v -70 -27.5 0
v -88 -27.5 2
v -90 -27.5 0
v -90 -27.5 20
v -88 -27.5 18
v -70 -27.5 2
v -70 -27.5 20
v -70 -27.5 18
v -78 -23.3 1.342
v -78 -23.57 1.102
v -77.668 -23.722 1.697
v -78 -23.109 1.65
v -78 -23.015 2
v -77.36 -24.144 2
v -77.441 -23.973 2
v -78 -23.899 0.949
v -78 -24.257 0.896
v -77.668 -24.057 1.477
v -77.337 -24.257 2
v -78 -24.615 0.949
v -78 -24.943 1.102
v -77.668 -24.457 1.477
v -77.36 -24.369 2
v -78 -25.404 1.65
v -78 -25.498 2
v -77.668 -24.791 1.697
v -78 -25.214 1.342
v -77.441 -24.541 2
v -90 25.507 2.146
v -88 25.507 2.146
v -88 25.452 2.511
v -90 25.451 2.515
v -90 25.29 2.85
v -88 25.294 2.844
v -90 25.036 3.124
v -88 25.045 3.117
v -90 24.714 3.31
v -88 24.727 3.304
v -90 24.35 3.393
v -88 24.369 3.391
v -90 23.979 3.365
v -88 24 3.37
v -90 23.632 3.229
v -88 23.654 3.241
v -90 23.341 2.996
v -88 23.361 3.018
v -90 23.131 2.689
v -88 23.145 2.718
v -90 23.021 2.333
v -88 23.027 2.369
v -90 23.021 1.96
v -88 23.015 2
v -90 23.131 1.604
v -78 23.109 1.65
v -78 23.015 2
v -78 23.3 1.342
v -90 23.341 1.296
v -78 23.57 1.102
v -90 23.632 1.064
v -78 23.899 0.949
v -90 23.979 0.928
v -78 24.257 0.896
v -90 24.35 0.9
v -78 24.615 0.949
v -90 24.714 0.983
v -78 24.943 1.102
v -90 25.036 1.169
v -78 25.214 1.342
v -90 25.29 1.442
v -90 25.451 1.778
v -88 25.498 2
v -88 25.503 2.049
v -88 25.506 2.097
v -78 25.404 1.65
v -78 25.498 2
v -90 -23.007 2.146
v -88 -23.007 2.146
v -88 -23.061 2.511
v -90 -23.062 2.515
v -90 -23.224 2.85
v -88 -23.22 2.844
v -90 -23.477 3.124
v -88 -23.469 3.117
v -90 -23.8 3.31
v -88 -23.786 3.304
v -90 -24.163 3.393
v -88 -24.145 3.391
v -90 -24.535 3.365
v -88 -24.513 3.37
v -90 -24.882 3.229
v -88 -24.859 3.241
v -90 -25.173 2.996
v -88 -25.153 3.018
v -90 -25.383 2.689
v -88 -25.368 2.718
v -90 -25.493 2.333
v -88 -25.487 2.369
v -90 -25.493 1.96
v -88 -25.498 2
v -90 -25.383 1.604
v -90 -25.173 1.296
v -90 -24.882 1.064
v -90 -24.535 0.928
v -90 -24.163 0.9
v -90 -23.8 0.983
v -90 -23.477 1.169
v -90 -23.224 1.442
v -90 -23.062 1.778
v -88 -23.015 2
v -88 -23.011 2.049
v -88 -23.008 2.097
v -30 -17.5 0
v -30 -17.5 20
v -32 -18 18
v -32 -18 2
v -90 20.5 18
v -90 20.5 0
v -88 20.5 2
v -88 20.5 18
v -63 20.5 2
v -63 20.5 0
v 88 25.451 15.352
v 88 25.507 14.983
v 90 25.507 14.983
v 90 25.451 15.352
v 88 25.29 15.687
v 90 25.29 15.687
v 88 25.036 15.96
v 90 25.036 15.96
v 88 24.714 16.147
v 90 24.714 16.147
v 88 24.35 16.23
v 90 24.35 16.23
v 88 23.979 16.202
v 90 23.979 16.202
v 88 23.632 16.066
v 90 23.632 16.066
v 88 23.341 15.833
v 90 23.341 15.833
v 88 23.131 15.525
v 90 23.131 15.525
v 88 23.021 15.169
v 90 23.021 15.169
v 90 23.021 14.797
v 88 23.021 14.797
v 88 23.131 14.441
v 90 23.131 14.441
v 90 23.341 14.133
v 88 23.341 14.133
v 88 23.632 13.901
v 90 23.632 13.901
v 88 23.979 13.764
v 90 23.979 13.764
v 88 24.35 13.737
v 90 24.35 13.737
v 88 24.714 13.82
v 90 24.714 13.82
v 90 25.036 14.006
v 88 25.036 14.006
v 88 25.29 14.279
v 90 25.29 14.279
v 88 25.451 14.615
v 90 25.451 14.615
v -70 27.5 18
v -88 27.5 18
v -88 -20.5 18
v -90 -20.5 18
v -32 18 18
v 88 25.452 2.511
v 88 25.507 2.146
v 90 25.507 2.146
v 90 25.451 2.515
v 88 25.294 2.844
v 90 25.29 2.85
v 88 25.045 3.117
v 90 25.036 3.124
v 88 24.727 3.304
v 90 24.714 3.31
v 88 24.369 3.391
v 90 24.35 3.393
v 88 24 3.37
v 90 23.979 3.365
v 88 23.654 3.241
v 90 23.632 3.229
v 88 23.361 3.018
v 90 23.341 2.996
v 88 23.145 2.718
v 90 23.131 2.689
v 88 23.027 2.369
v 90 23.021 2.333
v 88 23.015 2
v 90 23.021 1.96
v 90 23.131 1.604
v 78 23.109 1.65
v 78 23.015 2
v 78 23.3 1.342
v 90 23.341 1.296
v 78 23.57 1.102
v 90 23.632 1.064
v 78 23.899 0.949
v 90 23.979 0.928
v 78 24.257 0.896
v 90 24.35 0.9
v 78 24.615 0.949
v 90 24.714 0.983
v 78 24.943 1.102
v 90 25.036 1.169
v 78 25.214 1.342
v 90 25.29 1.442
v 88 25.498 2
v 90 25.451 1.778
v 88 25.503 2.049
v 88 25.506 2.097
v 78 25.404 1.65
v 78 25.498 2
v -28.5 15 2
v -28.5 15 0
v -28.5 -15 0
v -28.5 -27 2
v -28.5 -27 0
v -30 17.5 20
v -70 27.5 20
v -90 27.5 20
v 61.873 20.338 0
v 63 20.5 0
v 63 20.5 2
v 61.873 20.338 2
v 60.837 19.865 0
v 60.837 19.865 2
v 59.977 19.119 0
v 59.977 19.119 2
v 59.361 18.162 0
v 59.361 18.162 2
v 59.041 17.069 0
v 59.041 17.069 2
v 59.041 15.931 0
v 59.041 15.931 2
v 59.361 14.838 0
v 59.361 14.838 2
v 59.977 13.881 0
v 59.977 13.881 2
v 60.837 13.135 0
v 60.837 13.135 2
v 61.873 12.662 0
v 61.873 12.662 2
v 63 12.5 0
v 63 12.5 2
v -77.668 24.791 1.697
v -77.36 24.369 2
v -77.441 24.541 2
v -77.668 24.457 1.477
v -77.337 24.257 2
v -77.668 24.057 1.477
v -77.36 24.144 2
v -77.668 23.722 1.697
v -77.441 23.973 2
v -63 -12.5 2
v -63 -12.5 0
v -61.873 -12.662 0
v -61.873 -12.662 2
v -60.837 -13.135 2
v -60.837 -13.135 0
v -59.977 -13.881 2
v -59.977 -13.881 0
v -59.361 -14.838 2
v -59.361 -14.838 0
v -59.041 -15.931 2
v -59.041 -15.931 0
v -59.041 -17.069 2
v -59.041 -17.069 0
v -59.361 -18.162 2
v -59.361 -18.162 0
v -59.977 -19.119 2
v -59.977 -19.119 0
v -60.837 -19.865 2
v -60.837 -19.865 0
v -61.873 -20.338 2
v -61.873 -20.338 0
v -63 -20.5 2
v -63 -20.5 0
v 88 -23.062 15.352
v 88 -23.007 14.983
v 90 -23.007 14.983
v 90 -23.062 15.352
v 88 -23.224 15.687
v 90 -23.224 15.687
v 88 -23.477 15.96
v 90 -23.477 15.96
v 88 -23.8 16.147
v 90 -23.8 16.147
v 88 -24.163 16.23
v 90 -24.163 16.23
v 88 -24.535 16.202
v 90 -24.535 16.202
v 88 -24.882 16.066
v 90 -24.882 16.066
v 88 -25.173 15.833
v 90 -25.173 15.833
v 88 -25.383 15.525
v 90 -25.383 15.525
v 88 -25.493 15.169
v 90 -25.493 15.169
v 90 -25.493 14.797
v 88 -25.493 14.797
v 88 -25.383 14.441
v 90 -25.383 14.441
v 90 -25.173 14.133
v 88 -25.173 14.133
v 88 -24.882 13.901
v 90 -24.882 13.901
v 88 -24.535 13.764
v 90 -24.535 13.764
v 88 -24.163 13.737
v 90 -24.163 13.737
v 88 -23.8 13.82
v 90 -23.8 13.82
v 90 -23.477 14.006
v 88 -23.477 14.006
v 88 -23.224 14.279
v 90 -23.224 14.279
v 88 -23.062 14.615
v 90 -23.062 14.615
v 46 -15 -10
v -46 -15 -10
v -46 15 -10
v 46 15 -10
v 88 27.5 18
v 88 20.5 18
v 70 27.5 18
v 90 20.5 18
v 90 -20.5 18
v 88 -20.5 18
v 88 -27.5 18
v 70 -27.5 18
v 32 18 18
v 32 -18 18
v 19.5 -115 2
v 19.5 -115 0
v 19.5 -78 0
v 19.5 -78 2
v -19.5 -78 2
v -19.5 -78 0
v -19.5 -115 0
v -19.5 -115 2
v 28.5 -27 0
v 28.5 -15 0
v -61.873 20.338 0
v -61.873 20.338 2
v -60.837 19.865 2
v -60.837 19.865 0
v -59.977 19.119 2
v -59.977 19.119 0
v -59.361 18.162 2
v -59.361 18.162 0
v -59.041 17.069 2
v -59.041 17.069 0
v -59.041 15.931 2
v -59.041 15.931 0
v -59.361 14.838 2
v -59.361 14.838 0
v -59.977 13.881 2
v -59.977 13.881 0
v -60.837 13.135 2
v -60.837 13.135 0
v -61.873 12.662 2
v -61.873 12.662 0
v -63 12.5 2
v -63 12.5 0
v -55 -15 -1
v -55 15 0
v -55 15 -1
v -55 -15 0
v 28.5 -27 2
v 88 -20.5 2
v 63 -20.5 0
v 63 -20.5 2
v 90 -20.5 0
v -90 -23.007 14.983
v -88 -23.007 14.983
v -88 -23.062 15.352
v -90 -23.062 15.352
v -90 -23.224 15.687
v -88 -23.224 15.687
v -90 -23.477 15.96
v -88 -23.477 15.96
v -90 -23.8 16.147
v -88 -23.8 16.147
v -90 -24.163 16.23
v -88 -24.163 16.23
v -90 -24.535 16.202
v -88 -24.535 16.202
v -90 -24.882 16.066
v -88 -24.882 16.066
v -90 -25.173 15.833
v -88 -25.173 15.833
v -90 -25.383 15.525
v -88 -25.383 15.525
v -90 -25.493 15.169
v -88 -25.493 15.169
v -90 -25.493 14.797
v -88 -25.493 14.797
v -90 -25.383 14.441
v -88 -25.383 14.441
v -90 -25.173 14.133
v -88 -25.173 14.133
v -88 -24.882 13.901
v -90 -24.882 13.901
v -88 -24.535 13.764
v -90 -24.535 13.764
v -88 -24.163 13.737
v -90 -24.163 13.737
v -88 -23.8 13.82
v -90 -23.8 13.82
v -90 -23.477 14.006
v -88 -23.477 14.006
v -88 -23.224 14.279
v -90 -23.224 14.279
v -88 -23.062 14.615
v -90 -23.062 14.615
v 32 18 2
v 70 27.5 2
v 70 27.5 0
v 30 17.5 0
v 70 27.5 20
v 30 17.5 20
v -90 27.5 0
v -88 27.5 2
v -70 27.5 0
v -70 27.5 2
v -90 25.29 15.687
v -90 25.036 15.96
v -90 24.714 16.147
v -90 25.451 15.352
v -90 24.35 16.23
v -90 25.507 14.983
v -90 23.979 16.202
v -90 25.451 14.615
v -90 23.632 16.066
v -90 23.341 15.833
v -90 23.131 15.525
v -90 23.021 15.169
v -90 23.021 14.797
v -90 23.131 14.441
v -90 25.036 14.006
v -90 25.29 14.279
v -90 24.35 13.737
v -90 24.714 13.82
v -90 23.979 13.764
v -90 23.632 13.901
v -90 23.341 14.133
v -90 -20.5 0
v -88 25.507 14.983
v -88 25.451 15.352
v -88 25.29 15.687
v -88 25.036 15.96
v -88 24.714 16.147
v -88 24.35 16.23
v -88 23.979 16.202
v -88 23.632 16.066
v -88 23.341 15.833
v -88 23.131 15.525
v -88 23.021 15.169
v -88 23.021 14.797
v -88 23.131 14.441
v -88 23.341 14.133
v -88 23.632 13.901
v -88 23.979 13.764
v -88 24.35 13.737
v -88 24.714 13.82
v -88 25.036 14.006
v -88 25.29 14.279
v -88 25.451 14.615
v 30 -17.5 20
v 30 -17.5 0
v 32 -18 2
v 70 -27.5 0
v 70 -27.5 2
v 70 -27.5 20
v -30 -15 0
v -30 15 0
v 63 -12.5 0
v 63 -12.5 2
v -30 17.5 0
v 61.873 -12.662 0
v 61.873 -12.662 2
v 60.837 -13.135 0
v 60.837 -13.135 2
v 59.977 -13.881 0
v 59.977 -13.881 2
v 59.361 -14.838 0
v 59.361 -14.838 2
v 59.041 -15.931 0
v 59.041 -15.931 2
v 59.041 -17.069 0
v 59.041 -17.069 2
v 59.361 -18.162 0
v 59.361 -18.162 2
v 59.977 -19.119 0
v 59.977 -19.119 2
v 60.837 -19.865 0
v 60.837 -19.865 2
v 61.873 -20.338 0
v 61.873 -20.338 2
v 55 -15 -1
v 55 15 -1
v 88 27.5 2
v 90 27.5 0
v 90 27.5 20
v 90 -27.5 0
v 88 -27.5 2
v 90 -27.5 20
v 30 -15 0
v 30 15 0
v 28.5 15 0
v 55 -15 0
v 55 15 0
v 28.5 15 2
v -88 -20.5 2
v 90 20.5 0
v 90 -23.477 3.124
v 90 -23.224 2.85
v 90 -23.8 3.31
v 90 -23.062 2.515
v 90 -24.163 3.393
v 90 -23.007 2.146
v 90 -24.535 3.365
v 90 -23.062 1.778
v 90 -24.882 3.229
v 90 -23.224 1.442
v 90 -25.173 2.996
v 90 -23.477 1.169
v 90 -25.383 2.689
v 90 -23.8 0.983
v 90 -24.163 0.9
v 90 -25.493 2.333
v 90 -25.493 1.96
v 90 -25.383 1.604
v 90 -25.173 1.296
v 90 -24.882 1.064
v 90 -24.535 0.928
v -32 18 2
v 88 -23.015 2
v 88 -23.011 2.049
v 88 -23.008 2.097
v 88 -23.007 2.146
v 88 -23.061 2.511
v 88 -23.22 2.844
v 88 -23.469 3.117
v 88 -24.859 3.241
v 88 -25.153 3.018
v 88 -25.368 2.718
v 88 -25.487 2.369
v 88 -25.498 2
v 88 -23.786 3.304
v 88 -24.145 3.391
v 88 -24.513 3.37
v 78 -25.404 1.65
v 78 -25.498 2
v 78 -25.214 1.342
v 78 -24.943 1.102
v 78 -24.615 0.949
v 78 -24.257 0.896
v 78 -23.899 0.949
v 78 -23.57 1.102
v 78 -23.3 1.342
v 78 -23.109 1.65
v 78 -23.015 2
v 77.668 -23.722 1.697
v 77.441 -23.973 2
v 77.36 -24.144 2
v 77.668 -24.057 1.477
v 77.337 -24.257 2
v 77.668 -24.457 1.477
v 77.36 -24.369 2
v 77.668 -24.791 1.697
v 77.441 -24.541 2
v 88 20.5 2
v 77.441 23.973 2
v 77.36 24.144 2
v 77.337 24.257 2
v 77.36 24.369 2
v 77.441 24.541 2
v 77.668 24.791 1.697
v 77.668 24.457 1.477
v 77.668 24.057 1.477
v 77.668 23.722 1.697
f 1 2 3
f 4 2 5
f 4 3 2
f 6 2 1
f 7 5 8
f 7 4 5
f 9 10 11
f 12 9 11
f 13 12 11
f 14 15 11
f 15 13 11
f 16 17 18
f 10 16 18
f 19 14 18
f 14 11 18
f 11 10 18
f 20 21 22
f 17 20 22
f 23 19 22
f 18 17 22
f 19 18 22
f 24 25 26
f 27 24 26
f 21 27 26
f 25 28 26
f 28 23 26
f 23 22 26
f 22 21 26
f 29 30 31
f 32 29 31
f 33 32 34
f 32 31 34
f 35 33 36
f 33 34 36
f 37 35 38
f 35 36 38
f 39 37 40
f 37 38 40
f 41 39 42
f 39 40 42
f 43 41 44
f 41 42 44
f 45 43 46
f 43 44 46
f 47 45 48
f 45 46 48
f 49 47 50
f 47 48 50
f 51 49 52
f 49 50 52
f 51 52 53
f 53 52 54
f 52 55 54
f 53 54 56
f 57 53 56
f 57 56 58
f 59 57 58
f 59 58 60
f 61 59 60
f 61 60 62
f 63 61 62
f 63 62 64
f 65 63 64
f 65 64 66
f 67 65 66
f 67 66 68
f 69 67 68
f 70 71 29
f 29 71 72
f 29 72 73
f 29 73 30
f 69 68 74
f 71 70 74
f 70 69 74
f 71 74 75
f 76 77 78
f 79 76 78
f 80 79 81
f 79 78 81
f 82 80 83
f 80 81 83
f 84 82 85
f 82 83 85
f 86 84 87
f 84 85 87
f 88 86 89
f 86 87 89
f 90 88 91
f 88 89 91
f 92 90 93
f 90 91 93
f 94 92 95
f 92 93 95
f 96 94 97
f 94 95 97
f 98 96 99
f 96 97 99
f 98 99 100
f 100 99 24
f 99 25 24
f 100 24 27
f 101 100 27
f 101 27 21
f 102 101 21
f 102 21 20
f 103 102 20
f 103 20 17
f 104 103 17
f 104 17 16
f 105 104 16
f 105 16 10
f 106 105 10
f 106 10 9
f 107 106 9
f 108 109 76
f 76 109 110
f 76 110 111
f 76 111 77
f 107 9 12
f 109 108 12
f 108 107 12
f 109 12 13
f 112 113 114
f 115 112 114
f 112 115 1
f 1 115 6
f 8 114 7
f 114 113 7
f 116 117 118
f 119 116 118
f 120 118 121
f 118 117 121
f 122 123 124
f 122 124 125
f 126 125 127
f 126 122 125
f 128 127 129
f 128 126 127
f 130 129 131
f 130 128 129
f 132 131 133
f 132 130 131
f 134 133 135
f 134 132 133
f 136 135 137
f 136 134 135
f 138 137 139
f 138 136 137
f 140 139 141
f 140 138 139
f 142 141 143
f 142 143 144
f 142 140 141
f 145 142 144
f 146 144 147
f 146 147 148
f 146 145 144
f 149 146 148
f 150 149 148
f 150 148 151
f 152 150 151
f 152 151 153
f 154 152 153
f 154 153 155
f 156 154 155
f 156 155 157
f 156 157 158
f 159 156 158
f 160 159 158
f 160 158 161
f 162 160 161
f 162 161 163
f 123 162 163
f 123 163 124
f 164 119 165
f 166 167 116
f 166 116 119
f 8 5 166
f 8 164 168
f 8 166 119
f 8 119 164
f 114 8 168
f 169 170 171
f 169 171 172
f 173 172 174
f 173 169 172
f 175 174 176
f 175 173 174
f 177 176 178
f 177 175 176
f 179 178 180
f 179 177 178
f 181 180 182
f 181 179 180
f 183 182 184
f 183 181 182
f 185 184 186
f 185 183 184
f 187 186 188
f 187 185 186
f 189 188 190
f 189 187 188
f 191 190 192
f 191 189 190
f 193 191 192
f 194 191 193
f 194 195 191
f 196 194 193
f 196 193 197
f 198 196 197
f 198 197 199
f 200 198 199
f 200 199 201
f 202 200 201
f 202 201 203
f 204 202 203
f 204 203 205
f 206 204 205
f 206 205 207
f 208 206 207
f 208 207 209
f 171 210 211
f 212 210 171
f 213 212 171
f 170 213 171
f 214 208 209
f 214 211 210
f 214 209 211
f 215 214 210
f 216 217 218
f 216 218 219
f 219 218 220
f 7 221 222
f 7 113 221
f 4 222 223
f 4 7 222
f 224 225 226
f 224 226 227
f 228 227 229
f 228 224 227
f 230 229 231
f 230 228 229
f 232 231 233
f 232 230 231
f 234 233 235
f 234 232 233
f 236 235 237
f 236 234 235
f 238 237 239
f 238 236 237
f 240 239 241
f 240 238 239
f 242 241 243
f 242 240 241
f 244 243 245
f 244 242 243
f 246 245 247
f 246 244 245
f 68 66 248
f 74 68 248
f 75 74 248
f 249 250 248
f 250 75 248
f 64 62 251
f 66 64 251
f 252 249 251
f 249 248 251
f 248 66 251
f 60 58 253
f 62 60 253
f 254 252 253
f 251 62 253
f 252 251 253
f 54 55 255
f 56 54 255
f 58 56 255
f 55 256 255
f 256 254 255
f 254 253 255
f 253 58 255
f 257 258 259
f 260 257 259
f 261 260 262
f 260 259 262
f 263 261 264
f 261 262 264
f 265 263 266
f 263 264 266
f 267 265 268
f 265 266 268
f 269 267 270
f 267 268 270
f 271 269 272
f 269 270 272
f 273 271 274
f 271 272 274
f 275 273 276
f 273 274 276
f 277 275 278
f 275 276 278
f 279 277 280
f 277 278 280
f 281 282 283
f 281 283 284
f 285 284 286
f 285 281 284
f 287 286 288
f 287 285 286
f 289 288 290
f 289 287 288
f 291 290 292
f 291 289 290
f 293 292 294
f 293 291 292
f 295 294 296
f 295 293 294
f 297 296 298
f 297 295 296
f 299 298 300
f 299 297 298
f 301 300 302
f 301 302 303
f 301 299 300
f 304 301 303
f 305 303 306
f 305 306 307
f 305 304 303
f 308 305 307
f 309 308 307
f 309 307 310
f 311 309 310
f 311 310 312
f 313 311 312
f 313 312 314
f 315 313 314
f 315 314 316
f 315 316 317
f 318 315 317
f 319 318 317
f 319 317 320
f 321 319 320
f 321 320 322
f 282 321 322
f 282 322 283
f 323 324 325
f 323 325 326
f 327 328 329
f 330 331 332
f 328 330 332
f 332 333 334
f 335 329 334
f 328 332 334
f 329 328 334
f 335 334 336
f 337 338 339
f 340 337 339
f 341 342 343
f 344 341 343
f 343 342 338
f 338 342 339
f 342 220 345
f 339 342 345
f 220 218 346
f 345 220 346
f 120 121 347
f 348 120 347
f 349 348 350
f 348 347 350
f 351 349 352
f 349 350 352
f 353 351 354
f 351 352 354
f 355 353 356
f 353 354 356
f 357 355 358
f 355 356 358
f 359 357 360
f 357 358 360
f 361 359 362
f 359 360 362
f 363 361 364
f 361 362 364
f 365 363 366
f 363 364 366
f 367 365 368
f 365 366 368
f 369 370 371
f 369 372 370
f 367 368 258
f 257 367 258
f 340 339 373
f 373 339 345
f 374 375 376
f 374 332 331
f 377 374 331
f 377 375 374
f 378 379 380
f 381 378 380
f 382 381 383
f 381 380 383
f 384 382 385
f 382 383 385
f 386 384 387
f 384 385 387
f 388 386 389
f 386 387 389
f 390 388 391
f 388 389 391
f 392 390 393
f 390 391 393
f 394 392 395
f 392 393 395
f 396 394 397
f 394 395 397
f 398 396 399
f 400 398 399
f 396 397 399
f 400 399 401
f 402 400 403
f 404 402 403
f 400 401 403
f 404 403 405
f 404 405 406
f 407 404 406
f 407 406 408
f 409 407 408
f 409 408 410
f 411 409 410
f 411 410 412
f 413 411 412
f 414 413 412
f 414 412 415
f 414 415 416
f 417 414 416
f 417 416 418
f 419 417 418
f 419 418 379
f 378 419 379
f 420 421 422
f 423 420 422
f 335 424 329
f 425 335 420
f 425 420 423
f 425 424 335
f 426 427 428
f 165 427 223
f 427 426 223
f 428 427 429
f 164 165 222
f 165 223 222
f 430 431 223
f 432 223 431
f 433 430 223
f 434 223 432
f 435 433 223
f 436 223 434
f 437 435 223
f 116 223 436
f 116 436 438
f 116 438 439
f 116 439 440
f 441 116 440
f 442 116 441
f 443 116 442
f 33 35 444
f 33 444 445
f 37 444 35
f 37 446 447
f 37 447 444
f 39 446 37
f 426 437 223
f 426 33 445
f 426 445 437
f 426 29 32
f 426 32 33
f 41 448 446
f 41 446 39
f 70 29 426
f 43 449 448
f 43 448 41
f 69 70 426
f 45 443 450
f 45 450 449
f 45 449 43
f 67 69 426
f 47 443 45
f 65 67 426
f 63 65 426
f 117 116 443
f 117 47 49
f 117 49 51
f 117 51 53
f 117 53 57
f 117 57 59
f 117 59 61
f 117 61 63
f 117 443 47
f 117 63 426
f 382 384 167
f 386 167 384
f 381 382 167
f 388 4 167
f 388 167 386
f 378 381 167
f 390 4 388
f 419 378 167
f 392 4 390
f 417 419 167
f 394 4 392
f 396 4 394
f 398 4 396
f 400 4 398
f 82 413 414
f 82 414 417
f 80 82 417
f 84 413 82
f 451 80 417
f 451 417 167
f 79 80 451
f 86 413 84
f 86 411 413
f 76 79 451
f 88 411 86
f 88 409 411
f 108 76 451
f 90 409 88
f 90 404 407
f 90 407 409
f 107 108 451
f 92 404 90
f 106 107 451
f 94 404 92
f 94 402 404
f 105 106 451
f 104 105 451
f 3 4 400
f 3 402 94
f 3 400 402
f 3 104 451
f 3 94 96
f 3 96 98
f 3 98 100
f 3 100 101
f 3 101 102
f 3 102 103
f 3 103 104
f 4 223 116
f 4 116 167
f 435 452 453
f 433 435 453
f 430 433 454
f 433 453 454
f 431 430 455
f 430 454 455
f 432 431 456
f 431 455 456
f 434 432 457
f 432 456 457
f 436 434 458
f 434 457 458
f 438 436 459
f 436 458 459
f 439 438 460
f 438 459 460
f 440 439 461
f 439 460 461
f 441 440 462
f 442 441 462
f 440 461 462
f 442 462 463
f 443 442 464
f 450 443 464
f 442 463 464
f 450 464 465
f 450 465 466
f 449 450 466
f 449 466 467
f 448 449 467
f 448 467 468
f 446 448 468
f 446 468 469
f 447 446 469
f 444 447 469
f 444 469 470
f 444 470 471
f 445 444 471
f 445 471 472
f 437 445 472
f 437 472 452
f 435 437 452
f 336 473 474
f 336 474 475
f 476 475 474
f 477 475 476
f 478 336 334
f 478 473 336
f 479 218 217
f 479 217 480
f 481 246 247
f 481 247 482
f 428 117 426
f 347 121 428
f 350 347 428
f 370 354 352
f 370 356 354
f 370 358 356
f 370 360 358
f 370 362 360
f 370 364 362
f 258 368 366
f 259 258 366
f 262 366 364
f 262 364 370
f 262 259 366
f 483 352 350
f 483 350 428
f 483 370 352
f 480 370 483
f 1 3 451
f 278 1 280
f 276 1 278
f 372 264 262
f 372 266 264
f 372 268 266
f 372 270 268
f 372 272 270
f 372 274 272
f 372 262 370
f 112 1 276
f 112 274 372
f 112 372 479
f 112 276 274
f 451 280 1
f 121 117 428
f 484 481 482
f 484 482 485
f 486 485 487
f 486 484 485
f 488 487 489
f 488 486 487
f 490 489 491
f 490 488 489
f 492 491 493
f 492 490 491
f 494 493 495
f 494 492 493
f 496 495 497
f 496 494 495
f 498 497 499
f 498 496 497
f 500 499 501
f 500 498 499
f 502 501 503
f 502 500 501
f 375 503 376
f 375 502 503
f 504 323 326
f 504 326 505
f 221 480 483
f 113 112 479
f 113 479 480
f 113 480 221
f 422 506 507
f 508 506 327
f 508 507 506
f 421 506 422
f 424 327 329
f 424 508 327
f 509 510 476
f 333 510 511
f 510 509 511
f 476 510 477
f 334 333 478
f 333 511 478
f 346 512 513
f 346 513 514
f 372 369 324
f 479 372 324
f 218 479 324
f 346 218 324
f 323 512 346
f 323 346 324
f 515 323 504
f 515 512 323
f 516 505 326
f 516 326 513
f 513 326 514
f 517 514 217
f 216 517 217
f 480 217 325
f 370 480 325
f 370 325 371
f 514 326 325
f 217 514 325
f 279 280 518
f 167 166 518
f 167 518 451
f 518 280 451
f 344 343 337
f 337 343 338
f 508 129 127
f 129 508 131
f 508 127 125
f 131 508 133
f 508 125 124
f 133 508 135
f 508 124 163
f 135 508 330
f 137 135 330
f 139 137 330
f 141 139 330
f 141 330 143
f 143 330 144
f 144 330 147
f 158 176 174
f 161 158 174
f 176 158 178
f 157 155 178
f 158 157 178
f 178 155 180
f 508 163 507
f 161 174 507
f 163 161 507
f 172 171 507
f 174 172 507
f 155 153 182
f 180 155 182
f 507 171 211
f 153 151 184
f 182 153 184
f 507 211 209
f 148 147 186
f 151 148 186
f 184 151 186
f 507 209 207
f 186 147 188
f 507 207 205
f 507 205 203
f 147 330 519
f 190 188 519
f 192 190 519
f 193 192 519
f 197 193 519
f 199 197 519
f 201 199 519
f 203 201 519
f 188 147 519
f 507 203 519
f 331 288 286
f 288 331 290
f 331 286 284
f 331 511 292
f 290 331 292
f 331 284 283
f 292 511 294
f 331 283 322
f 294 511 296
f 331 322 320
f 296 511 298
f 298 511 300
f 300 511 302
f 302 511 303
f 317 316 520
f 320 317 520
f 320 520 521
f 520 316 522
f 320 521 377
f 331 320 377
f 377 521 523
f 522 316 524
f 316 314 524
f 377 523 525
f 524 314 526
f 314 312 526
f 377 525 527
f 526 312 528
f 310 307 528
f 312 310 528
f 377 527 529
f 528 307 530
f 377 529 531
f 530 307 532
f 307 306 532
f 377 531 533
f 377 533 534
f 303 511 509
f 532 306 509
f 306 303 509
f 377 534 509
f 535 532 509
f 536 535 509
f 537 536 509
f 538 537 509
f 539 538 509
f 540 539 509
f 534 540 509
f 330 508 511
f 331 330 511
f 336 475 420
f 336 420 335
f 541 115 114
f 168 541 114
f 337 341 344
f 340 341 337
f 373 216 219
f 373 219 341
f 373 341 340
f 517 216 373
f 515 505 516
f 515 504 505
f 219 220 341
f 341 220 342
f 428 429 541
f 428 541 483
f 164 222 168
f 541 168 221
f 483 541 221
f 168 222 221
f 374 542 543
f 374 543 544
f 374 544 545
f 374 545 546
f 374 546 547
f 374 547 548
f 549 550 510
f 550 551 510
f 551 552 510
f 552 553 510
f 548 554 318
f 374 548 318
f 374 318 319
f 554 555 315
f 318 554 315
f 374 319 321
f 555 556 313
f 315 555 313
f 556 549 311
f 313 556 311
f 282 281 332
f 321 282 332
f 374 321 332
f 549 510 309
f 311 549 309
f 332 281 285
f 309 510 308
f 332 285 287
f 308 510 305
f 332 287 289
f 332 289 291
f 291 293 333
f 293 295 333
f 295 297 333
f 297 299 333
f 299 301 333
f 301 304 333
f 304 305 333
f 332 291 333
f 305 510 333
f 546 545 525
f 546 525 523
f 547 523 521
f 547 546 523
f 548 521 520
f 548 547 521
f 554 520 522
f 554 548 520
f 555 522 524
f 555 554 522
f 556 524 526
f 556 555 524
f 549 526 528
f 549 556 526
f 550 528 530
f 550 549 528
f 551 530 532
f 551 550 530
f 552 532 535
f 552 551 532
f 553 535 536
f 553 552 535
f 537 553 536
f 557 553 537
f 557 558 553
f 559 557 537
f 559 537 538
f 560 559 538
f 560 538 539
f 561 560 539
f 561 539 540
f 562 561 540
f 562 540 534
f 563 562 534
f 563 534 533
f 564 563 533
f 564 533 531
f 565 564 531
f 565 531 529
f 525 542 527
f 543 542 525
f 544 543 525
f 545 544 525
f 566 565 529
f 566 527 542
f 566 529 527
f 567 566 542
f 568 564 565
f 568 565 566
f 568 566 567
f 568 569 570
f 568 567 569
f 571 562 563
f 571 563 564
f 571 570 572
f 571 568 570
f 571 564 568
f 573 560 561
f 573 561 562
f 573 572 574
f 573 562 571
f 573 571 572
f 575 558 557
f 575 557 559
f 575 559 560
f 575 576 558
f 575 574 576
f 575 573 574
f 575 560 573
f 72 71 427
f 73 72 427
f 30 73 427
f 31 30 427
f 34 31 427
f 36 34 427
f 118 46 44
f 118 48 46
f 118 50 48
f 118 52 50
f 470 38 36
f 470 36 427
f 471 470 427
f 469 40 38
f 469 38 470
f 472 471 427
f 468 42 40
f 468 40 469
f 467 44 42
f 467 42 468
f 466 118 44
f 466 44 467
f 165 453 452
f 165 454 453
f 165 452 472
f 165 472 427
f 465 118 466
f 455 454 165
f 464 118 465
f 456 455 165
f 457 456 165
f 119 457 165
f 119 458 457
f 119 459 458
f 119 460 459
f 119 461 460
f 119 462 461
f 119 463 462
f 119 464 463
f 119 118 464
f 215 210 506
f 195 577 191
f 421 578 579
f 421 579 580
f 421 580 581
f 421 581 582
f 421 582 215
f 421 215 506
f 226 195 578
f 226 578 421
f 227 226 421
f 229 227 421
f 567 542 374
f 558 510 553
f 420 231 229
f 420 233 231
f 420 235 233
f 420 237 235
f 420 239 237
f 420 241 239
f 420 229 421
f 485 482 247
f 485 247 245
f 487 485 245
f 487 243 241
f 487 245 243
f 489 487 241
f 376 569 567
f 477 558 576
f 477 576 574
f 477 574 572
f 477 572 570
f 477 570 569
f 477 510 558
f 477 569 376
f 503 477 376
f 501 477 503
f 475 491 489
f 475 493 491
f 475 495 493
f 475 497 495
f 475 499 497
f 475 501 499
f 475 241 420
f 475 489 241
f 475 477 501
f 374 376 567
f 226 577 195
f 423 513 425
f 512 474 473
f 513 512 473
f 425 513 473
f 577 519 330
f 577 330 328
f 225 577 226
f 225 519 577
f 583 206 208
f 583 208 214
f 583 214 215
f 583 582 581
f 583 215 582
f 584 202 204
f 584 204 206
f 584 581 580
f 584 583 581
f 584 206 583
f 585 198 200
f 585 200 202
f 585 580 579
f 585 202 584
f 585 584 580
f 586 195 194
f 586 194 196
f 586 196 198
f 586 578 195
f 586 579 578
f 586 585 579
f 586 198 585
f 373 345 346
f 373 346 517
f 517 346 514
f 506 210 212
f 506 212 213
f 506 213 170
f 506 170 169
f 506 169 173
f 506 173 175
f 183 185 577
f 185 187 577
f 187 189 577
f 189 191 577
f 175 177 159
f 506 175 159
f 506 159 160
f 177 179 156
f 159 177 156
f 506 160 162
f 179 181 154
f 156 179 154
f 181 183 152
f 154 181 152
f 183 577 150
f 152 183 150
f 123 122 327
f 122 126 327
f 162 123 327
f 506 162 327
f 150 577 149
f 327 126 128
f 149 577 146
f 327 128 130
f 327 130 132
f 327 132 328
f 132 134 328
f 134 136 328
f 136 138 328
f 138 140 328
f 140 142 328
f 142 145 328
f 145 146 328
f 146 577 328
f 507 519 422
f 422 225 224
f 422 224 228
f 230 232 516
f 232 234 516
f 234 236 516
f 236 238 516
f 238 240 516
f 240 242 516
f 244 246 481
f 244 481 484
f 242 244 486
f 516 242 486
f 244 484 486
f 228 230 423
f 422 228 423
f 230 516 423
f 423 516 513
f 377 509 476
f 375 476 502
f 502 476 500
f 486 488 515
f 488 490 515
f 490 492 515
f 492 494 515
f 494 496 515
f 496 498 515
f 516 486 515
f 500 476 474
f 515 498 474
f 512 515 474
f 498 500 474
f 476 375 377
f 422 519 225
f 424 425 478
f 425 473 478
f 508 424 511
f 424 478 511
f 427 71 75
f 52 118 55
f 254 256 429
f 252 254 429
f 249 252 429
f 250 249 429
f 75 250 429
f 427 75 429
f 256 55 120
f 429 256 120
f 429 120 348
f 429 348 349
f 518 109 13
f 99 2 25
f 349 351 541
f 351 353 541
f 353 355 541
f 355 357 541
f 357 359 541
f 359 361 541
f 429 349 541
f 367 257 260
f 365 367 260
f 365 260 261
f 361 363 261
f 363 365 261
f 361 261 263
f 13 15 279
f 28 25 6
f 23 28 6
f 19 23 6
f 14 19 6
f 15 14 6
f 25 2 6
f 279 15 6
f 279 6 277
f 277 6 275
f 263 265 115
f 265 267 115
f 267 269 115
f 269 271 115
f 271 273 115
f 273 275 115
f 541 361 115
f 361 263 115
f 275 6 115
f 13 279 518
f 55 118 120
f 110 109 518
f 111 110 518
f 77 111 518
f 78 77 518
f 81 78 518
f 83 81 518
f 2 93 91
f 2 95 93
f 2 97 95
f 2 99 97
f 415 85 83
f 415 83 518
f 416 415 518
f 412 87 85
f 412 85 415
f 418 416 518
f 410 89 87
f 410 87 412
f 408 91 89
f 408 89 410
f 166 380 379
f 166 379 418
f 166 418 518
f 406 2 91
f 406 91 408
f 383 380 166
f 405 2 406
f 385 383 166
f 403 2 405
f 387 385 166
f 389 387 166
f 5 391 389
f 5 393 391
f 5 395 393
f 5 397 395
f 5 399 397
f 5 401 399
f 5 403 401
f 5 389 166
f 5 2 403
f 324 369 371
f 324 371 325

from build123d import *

# Parameters (mm, degrees)
F0_W      = 56
F0_H      = 16
F1_DEPTH  = 27.5
F2_DEPTH  = 15
F4_DEPTH  = 30.001
F6_DEPTH  = 18
F9_D      = 2.5
F9_DEPTH  = 12
F9_TIP    = 0.7510757738
F11_DEPTH = 2


with BuildPart() as f1:
    # F0 (on Front) → F1 (new body, symmetric)
    with BuildSketch(Plane.XZ):
        Polygon((-30, 20), (-90, 20), (-90, 0), (-55, 0), (-30, 0), align=None)
        with Locations((-60, 10)):
            Rectangle(F0_W, F0_H, mode=Mode.SUBTRACT)
    extrude(amount=F1_DEPTH, both=True)


with BuildPart() as f1b:
    # F0 (on Front) → F1, piece 2 (new body, symmetric)
    with BuildSketch(Plane.XZ):
        Polygon((30, 20), (30, 0), (55, 0), (90, 0), (90, 20), align=None)
        with Locations((60, 10)):
            Rectangle(F0_W, F0_H, mode=Mode.SUBTRACT)
    extrude(amount=F1_DEPTH, both=True)


with BuildPart() as f2:
    # F0 (on Front) → F2 (new body, symmetric)
    with BuildSketch(Plane.XZ):
        Polygon((30, 0), (-30, 0), (-55, 0), (-55, -1), (-46, -10), (46, -10), (55, -1), (55, 0), align=None)
    extrude(amount=F2_DEPTH, both=True)

    # F10 (on face) → F11 (join)
    with BuildSketch(Plane.XY):
        Polygon((28.5, 15), (-28.5, 15), (-28.5, -27), (-19.5, -78), (-19.5, -115), (19.5, -115), (19.5, -78), (28.5, -27), align=None)
    extrude(amount=F11_DEPTH)


with BuildPart() as f4_tool:
    # F3 (on face) → F4 (new body, through all)
    with BuildSketch(Plane.XY.offset(20)):
        Polygon((-30, 27.5), (-70, 27.5), (-30, 17.5), align=None)
        Polygon((-70, -27.5), (-30, -27.5), (-30, -17.5), align=None)
        Polygon((30, 17.5), (70, 27.5), (30, 27.5), align=None)
        Polygon((70, -27.5), (30, -17.5), (30, -27.5), align=None)
    extrude(amount=-F4_DEPTH)


with BuildPart() as f1_1:
    add(f1.part)

    # F4: cut by f4_tool
    add(f4_tool.part, mode=Mode.SUBTRACT)

    # F5 (on face) → F6 (cut, through all)
    with BuildSketch(Plane(origin=(0, 0, 0), x_dir=(1, 0, 0), z_dir=(0, 0, -1))):
        with BuildLine():
            Line((-63, 20.5), (-90, 20.5))
            Line((-90, 20.5), (-90, -20.5))
            Line((-90, -20.5), (-63, -20.5))
            ThreePointArc((-63, -20.5), (-59, -16.5), (-63, -12.5))
            Line((-63, -12.5), (-63, 12.5))
            ThreePointArc((-63, 12.5), (-59, 16.5), (-63, 20.5))
        make_face()
    extrude(amount=-F6_DEPTH, mode=Mode.SUBTRACT)

    # F9
    with Locations(Plane(origin=(-90, 0, 0), x_dir=(0, -1, 0), z_dir=(-1, 0, 0))):
        with Locations((-24.2568291724, 14.9830980226), (-24.2568291724, 2.1462233271), (24.2568291724, 14.9830980226), (24.2568291724, 2.1462233271)):
            Hole(F9_D / 2, depth=F9_DEPTH)
            with Locations((0, 0, -(F9_DEPTH + F9_TIP / 2))):  # 118° drill point
                Cone(0, F9_D / 2, F9_TIP, mode=Mode.SUBTRACT)



with BuildPart() as f1b_1:
    add(f1b.part)

    # F4: cut by f4_tool
    add(f4_tool.part, mode=Mode.SUBTRACT)


with BuildPart() as f1_2:
    add(f1_1.part)

    add(f2.part)  # F12 merges F2
    # F12: F1 across plane
    add(f1_1.part.mirror(Plane.YZ))


solid = f1_2.part
